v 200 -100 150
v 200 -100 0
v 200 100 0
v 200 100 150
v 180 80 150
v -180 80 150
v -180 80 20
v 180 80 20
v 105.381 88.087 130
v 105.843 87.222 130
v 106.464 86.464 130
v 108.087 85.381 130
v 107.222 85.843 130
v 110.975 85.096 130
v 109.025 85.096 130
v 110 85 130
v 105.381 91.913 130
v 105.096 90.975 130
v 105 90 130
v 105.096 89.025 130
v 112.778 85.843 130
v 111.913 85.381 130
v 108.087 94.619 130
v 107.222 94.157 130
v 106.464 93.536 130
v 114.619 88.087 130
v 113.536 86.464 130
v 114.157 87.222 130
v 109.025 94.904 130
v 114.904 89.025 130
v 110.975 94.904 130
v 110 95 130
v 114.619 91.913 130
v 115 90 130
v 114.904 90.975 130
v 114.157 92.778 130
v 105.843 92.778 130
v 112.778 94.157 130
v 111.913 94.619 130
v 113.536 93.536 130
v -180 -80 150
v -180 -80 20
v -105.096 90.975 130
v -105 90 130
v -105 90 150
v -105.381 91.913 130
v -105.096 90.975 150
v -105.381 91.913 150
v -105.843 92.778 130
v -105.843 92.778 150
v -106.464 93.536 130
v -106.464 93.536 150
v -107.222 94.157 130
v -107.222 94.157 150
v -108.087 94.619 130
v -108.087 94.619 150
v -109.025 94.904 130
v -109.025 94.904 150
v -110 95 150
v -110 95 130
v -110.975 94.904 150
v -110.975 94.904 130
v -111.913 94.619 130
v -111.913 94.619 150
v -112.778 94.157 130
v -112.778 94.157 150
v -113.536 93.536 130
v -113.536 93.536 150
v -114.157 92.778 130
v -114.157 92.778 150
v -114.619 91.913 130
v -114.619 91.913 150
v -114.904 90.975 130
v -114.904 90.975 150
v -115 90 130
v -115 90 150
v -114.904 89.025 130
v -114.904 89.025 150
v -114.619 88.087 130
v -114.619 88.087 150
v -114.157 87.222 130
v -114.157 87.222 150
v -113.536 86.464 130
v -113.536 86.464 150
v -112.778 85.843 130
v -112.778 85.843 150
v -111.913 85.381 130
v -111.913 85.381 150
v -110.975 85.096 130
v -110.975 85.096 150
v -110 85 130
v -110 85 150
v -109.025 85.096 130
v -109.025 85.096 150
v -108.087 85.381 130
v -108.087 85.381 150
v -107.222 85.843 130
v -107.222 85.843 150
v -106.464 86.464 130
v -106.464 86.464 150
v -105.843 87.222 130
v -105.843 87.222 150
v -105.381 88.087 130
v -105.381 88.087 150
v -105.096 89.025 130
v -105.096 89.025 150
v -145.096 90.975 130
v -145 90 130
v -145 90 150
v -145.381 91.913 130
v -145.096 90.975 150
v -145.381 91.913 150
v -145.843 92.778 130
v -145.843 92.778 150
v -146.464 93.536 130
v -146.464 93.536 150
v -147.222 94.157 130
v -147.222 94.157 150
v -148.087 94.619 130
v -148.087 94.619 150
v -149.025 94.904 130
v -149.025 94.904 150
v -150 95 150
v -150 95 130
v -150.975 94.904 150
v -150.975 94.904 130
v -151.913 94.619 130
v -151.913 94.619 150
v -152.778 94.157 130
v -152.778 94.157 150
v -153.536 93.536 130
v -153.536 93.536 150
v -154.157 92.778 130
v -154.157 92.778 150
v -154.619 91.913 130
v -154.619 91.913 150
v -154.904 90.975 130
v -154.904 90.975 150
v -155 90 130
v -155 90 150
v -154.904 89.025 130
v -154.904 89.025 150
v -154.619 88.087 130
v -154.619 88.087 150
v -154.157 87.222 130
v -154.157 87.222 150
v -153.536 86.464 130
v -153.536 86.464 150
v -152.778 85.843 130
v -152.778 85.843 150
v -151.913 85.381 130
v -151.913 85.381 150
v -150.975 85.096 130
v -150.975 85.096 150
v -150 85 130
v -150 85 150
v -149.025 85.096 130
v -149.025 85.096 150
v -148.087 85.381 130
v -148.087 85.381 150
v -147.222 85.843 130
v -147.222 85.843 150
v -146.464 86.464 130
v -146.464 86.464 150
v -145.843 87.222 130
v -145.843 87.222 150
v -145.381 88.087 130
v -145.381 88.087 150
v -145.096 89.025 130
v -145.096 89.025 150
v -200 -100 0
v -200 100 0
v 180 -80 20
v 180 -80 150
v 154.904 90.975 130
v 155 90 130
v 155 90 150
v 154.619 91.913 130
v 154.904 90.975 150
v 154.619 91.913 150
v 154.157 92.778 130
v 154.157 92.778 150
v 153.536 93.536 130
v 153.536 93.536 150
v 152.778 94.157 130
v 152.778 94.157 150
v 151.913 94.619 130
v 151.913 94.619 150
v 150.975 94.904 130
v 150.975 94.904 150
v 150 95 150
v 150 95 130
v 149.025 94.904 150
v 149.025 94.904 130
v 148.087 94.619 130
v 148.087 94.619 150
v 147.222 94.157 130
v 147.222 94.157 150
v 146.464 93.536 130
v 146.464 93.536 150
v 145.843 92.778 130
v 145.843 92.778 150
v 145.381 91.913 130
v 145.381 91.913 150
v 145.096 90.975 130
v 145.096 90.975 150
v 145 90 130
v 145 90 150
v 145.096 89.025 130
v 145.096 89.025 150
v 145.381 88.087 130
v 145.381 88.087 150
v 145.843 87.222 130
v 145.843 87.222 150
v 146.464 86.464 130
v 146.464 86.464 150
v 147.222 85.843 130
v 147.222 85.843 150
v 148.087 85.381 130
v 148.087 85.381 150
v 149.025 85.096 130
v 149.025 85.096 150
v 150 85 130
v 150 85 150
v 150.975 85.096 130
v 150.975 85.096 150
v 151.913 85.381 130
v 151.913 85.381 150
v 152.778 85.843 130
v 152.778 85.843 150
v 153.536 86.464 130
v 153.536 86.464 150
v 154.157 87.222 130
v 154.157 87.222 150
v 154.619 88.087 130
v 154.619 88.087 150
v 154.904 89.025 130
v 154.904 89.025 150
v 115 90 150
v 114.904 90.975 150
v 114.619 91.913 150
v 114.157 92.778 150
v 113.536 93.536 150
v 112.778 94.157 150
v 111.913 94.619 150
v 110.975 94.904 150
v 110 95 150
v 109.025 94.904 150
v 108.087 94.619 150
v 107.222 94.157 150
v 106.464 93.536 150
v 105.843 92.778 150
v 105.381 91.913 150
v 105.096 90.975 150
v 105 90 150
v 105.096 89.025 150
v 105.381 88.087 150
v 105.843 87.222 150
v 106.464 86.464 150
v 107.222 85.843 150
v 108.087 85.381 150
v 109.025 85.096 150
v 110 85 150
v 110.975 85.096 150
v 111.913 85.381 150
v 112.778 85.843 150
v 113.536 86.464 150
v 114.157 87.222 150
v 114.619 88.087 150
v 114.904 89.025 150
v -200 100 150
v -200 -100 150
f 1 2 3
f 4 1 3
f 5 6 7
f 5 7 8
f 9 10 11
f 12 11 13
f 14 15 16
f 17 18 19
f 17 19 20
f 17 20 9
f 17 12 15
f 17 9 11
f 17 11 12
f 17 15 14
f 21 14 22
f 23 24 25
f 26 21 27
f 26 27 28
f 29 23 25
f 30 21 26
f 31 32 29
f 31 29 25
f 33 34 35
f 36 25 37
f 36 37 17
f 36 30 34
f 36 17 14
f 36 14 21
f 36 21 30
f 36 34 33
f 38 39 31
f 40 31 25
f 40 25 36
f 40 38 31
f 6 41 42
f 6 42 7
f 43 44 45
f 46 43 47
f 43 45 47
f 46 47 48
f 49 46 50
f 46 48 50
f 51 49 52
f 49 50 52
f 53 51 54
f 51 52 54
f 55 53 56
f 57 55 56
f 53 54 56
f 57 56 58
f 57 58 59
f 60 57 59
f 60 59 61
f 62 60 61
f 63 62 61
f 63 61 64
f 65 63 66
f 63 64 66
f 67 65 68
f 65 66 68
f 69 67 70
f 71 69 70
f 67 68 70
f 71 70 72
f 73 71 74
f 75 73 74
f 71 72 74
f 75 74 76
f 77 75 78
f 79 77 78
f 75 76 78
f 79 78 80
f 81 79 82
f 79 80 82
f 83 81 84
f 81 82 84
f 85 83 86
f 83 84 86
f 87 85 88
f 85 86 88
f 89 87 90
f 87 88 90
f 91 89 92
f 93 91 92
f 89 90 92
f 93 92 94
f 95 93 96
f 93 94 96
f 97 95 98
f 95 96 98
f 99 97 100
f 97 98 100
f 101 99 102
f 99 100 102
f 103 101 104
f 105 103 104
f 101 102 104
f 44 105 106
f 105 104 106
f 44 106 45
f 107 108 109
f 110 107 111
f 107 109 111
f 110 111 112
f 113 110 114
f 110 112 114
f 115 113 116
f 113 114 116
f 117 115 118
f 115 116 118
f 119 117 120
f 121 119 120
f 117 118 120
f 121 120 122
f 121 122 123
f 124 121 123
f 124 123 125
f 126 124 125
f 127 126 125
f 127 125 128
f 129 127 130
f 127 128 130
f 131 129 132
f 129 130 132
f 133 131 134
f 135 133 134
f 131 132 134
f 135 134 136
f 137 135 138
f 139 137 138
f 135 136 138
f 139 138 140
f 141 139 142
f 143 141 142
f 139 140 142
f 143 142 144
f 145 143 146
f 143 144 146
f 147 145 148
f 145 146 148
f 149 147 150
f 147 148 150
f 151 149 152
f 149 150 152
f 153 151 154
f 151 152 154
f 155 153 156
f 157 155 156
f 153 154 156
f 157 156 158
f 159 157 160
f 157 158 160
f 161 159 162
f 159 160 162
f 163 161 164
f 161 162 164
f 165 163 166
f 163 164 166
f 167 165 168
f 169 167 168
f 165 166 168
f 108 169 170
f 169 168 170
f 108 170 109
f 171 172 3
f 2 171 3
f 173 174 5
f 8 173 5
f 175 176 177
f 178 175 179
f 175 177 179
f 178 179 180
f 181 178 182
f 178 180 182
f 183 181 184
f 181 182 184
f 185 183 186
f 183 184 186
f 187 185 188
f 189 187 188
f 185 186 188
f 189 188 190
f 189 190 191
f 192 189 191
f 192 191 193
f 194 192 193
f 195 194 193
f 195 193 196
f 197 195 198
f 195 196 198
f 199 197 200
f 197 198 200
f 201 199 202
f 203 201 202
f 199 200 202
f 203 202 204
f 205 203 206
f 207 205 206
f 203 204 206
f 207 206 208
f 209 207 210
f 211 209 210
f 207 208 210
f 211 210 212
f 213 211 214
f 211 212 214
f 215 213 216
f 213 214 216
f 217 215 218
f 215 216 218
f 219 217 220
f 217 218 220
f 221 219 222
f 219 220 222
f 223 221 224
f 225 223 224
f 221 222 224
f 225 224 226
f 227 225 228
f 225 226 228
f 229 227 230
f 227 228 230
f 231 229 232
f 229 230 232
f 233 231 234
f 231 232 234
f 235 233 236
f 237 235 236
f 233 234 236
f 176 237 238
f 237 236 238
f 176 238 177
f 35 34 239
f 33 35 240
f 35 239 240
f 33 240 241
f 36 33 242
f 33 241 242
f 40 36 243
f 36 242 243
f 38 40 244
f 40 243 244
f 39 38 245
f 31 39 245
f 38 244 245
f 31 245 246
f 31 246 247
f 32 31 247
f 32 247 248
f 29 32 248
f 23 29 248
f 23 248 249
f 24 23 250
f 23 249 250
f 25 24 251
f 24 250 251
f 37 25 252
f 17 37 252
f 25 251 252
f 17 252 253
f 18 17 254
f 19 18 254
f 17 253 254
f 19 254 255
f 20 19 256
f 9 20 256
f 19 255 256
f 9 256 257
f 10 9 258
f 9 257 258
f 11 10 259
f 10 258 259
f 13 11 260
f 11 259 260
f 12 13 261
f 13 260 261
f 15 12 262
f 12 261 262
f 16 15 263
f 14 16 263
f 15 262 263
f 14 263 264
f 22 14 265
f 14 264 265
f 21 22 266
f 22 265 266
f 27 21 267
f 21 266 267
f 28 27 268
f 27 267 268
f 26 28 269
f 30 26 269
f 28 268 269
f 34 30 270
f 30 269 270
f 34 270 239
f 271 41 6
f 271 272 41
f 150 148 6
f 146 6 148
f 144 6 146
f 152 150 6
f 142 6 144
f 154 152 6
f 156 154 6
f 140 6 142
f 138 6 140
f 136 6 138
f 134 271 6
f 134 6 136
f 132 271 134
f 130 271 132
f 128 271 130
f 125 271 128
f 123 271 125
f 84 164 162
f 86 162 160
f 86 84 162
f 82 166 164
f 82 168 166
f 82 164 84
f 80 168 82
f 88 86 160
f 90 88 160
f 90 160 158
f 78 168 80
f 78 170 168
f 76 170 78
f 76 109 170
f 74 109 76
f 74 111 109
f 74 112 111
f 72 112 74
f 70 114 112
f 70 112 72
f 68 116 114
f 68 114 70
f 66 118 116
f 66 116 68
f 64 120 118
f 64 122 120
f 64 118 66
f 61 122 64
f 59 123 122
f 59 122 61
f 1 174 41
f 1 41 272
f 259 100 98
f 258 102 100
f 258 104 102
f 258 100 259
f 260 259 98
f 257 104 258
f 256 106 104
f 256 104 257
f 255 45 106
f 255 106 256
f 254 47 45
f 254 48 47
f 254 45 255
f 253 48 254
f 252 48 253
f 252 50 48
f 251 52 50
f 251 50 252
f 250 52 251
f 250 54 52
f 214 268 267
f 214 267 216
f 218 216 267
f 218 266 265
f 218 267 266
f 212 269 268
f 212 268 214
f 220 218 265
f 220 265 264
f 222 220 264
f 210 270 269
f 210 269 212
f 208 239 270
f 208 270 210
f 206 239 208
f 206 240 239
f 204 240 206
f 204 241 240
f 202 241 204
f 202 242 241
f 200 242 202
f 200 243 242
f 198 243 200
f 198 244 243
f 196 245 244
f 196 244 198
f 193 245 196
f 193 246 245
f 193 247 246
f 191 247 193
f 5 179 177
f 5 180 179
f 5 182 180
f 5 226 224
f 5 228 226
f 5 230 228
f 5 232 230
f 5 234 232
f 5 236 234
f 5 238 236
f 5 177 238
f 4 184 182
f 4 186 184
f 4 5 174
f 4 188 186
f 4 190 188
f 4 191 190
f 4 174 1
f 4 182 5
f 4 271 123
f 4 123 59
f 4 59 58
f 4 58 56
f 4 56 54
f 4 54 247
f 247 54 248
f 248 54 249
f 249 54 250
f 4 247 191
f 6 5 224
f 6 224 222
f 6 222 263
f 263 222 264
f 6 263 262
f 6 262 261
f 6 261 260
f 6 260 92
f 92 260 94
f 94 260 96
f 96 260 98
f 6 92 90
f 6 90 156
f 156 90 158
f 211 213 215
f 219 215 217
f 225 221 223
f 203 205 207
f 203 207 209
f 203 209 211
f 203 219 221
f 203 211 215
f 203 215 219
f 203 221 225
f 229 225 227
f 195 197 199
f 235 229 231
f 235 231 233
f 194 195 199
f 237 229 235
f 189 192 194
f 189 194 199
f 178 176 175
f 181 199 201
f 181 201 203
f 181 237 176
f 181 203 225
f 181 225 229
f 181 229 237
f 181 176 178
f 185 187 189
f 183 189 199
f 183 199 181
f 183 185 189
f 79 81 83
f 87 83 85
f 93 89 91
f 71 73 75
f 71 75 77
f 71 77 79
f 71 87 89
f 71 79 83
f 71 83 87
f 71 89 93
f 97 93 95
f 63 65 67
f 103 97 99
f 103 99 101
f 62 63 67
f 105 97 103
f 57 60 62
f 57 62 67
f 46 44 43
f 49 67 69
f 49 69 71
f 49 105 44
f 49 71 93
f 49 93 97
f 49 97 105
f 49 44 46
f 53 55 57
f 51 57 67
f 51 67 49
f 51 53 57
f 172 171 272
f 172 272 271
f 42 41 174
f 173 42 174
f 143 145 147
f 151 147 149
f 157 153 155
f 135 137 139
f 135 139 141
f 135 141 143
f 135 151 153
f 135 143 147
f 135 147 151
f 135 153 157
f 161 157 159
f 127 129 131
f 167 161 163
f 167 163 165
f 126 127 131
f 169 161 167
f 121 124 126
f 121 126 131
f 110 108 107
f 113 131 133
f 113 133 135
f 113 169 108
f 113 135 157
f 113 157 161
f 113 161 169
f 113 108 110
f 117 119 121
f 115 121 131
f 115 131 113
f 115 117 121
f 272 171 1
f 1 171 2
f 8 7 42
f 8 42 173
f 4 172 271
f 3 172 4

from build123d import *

# Parameters (mm, degrees)
F0_W     = 400
F0_H     = 200
F1_DEPTH = 150
F2_W     = 360
F2_H     = 160
F3_DEPTH = 130
F4_R     = 5
F5_DEPTH = 20


with BuildPart() as f1:
    # F0 (on Top) → F1 (new body)
    with BuildSketch(Plane.XY):
        Rectangle(F0_W, F0_H)
    extrude(amount=F1_DEPTH)

    # F2 (on face) → F3 (cut)
    with BuildSketch(Plane.XY.offset(150)):
        Rectangle(F2_W, F2_H)
    extrude(amount=-F3_DEPTH, mode=Mode.SUBTRACT)

    # F4 (on face) → F5 (cut)
    with BuildSketch(Plane.XY.offset(150)):
        with Locations((-150, 90)):
            Circle(F4_R)
        with Locations((-110, 90)):
            Circle(F4_R)
        with Locations((110, 90)):
            Circle(F4_R)
        with Locations((150, 90)):
            Circle(F4_R)
    extrude(amount=-F5_DEPTH, mode=Mode.SUBTRACT)


solid = f1.part
